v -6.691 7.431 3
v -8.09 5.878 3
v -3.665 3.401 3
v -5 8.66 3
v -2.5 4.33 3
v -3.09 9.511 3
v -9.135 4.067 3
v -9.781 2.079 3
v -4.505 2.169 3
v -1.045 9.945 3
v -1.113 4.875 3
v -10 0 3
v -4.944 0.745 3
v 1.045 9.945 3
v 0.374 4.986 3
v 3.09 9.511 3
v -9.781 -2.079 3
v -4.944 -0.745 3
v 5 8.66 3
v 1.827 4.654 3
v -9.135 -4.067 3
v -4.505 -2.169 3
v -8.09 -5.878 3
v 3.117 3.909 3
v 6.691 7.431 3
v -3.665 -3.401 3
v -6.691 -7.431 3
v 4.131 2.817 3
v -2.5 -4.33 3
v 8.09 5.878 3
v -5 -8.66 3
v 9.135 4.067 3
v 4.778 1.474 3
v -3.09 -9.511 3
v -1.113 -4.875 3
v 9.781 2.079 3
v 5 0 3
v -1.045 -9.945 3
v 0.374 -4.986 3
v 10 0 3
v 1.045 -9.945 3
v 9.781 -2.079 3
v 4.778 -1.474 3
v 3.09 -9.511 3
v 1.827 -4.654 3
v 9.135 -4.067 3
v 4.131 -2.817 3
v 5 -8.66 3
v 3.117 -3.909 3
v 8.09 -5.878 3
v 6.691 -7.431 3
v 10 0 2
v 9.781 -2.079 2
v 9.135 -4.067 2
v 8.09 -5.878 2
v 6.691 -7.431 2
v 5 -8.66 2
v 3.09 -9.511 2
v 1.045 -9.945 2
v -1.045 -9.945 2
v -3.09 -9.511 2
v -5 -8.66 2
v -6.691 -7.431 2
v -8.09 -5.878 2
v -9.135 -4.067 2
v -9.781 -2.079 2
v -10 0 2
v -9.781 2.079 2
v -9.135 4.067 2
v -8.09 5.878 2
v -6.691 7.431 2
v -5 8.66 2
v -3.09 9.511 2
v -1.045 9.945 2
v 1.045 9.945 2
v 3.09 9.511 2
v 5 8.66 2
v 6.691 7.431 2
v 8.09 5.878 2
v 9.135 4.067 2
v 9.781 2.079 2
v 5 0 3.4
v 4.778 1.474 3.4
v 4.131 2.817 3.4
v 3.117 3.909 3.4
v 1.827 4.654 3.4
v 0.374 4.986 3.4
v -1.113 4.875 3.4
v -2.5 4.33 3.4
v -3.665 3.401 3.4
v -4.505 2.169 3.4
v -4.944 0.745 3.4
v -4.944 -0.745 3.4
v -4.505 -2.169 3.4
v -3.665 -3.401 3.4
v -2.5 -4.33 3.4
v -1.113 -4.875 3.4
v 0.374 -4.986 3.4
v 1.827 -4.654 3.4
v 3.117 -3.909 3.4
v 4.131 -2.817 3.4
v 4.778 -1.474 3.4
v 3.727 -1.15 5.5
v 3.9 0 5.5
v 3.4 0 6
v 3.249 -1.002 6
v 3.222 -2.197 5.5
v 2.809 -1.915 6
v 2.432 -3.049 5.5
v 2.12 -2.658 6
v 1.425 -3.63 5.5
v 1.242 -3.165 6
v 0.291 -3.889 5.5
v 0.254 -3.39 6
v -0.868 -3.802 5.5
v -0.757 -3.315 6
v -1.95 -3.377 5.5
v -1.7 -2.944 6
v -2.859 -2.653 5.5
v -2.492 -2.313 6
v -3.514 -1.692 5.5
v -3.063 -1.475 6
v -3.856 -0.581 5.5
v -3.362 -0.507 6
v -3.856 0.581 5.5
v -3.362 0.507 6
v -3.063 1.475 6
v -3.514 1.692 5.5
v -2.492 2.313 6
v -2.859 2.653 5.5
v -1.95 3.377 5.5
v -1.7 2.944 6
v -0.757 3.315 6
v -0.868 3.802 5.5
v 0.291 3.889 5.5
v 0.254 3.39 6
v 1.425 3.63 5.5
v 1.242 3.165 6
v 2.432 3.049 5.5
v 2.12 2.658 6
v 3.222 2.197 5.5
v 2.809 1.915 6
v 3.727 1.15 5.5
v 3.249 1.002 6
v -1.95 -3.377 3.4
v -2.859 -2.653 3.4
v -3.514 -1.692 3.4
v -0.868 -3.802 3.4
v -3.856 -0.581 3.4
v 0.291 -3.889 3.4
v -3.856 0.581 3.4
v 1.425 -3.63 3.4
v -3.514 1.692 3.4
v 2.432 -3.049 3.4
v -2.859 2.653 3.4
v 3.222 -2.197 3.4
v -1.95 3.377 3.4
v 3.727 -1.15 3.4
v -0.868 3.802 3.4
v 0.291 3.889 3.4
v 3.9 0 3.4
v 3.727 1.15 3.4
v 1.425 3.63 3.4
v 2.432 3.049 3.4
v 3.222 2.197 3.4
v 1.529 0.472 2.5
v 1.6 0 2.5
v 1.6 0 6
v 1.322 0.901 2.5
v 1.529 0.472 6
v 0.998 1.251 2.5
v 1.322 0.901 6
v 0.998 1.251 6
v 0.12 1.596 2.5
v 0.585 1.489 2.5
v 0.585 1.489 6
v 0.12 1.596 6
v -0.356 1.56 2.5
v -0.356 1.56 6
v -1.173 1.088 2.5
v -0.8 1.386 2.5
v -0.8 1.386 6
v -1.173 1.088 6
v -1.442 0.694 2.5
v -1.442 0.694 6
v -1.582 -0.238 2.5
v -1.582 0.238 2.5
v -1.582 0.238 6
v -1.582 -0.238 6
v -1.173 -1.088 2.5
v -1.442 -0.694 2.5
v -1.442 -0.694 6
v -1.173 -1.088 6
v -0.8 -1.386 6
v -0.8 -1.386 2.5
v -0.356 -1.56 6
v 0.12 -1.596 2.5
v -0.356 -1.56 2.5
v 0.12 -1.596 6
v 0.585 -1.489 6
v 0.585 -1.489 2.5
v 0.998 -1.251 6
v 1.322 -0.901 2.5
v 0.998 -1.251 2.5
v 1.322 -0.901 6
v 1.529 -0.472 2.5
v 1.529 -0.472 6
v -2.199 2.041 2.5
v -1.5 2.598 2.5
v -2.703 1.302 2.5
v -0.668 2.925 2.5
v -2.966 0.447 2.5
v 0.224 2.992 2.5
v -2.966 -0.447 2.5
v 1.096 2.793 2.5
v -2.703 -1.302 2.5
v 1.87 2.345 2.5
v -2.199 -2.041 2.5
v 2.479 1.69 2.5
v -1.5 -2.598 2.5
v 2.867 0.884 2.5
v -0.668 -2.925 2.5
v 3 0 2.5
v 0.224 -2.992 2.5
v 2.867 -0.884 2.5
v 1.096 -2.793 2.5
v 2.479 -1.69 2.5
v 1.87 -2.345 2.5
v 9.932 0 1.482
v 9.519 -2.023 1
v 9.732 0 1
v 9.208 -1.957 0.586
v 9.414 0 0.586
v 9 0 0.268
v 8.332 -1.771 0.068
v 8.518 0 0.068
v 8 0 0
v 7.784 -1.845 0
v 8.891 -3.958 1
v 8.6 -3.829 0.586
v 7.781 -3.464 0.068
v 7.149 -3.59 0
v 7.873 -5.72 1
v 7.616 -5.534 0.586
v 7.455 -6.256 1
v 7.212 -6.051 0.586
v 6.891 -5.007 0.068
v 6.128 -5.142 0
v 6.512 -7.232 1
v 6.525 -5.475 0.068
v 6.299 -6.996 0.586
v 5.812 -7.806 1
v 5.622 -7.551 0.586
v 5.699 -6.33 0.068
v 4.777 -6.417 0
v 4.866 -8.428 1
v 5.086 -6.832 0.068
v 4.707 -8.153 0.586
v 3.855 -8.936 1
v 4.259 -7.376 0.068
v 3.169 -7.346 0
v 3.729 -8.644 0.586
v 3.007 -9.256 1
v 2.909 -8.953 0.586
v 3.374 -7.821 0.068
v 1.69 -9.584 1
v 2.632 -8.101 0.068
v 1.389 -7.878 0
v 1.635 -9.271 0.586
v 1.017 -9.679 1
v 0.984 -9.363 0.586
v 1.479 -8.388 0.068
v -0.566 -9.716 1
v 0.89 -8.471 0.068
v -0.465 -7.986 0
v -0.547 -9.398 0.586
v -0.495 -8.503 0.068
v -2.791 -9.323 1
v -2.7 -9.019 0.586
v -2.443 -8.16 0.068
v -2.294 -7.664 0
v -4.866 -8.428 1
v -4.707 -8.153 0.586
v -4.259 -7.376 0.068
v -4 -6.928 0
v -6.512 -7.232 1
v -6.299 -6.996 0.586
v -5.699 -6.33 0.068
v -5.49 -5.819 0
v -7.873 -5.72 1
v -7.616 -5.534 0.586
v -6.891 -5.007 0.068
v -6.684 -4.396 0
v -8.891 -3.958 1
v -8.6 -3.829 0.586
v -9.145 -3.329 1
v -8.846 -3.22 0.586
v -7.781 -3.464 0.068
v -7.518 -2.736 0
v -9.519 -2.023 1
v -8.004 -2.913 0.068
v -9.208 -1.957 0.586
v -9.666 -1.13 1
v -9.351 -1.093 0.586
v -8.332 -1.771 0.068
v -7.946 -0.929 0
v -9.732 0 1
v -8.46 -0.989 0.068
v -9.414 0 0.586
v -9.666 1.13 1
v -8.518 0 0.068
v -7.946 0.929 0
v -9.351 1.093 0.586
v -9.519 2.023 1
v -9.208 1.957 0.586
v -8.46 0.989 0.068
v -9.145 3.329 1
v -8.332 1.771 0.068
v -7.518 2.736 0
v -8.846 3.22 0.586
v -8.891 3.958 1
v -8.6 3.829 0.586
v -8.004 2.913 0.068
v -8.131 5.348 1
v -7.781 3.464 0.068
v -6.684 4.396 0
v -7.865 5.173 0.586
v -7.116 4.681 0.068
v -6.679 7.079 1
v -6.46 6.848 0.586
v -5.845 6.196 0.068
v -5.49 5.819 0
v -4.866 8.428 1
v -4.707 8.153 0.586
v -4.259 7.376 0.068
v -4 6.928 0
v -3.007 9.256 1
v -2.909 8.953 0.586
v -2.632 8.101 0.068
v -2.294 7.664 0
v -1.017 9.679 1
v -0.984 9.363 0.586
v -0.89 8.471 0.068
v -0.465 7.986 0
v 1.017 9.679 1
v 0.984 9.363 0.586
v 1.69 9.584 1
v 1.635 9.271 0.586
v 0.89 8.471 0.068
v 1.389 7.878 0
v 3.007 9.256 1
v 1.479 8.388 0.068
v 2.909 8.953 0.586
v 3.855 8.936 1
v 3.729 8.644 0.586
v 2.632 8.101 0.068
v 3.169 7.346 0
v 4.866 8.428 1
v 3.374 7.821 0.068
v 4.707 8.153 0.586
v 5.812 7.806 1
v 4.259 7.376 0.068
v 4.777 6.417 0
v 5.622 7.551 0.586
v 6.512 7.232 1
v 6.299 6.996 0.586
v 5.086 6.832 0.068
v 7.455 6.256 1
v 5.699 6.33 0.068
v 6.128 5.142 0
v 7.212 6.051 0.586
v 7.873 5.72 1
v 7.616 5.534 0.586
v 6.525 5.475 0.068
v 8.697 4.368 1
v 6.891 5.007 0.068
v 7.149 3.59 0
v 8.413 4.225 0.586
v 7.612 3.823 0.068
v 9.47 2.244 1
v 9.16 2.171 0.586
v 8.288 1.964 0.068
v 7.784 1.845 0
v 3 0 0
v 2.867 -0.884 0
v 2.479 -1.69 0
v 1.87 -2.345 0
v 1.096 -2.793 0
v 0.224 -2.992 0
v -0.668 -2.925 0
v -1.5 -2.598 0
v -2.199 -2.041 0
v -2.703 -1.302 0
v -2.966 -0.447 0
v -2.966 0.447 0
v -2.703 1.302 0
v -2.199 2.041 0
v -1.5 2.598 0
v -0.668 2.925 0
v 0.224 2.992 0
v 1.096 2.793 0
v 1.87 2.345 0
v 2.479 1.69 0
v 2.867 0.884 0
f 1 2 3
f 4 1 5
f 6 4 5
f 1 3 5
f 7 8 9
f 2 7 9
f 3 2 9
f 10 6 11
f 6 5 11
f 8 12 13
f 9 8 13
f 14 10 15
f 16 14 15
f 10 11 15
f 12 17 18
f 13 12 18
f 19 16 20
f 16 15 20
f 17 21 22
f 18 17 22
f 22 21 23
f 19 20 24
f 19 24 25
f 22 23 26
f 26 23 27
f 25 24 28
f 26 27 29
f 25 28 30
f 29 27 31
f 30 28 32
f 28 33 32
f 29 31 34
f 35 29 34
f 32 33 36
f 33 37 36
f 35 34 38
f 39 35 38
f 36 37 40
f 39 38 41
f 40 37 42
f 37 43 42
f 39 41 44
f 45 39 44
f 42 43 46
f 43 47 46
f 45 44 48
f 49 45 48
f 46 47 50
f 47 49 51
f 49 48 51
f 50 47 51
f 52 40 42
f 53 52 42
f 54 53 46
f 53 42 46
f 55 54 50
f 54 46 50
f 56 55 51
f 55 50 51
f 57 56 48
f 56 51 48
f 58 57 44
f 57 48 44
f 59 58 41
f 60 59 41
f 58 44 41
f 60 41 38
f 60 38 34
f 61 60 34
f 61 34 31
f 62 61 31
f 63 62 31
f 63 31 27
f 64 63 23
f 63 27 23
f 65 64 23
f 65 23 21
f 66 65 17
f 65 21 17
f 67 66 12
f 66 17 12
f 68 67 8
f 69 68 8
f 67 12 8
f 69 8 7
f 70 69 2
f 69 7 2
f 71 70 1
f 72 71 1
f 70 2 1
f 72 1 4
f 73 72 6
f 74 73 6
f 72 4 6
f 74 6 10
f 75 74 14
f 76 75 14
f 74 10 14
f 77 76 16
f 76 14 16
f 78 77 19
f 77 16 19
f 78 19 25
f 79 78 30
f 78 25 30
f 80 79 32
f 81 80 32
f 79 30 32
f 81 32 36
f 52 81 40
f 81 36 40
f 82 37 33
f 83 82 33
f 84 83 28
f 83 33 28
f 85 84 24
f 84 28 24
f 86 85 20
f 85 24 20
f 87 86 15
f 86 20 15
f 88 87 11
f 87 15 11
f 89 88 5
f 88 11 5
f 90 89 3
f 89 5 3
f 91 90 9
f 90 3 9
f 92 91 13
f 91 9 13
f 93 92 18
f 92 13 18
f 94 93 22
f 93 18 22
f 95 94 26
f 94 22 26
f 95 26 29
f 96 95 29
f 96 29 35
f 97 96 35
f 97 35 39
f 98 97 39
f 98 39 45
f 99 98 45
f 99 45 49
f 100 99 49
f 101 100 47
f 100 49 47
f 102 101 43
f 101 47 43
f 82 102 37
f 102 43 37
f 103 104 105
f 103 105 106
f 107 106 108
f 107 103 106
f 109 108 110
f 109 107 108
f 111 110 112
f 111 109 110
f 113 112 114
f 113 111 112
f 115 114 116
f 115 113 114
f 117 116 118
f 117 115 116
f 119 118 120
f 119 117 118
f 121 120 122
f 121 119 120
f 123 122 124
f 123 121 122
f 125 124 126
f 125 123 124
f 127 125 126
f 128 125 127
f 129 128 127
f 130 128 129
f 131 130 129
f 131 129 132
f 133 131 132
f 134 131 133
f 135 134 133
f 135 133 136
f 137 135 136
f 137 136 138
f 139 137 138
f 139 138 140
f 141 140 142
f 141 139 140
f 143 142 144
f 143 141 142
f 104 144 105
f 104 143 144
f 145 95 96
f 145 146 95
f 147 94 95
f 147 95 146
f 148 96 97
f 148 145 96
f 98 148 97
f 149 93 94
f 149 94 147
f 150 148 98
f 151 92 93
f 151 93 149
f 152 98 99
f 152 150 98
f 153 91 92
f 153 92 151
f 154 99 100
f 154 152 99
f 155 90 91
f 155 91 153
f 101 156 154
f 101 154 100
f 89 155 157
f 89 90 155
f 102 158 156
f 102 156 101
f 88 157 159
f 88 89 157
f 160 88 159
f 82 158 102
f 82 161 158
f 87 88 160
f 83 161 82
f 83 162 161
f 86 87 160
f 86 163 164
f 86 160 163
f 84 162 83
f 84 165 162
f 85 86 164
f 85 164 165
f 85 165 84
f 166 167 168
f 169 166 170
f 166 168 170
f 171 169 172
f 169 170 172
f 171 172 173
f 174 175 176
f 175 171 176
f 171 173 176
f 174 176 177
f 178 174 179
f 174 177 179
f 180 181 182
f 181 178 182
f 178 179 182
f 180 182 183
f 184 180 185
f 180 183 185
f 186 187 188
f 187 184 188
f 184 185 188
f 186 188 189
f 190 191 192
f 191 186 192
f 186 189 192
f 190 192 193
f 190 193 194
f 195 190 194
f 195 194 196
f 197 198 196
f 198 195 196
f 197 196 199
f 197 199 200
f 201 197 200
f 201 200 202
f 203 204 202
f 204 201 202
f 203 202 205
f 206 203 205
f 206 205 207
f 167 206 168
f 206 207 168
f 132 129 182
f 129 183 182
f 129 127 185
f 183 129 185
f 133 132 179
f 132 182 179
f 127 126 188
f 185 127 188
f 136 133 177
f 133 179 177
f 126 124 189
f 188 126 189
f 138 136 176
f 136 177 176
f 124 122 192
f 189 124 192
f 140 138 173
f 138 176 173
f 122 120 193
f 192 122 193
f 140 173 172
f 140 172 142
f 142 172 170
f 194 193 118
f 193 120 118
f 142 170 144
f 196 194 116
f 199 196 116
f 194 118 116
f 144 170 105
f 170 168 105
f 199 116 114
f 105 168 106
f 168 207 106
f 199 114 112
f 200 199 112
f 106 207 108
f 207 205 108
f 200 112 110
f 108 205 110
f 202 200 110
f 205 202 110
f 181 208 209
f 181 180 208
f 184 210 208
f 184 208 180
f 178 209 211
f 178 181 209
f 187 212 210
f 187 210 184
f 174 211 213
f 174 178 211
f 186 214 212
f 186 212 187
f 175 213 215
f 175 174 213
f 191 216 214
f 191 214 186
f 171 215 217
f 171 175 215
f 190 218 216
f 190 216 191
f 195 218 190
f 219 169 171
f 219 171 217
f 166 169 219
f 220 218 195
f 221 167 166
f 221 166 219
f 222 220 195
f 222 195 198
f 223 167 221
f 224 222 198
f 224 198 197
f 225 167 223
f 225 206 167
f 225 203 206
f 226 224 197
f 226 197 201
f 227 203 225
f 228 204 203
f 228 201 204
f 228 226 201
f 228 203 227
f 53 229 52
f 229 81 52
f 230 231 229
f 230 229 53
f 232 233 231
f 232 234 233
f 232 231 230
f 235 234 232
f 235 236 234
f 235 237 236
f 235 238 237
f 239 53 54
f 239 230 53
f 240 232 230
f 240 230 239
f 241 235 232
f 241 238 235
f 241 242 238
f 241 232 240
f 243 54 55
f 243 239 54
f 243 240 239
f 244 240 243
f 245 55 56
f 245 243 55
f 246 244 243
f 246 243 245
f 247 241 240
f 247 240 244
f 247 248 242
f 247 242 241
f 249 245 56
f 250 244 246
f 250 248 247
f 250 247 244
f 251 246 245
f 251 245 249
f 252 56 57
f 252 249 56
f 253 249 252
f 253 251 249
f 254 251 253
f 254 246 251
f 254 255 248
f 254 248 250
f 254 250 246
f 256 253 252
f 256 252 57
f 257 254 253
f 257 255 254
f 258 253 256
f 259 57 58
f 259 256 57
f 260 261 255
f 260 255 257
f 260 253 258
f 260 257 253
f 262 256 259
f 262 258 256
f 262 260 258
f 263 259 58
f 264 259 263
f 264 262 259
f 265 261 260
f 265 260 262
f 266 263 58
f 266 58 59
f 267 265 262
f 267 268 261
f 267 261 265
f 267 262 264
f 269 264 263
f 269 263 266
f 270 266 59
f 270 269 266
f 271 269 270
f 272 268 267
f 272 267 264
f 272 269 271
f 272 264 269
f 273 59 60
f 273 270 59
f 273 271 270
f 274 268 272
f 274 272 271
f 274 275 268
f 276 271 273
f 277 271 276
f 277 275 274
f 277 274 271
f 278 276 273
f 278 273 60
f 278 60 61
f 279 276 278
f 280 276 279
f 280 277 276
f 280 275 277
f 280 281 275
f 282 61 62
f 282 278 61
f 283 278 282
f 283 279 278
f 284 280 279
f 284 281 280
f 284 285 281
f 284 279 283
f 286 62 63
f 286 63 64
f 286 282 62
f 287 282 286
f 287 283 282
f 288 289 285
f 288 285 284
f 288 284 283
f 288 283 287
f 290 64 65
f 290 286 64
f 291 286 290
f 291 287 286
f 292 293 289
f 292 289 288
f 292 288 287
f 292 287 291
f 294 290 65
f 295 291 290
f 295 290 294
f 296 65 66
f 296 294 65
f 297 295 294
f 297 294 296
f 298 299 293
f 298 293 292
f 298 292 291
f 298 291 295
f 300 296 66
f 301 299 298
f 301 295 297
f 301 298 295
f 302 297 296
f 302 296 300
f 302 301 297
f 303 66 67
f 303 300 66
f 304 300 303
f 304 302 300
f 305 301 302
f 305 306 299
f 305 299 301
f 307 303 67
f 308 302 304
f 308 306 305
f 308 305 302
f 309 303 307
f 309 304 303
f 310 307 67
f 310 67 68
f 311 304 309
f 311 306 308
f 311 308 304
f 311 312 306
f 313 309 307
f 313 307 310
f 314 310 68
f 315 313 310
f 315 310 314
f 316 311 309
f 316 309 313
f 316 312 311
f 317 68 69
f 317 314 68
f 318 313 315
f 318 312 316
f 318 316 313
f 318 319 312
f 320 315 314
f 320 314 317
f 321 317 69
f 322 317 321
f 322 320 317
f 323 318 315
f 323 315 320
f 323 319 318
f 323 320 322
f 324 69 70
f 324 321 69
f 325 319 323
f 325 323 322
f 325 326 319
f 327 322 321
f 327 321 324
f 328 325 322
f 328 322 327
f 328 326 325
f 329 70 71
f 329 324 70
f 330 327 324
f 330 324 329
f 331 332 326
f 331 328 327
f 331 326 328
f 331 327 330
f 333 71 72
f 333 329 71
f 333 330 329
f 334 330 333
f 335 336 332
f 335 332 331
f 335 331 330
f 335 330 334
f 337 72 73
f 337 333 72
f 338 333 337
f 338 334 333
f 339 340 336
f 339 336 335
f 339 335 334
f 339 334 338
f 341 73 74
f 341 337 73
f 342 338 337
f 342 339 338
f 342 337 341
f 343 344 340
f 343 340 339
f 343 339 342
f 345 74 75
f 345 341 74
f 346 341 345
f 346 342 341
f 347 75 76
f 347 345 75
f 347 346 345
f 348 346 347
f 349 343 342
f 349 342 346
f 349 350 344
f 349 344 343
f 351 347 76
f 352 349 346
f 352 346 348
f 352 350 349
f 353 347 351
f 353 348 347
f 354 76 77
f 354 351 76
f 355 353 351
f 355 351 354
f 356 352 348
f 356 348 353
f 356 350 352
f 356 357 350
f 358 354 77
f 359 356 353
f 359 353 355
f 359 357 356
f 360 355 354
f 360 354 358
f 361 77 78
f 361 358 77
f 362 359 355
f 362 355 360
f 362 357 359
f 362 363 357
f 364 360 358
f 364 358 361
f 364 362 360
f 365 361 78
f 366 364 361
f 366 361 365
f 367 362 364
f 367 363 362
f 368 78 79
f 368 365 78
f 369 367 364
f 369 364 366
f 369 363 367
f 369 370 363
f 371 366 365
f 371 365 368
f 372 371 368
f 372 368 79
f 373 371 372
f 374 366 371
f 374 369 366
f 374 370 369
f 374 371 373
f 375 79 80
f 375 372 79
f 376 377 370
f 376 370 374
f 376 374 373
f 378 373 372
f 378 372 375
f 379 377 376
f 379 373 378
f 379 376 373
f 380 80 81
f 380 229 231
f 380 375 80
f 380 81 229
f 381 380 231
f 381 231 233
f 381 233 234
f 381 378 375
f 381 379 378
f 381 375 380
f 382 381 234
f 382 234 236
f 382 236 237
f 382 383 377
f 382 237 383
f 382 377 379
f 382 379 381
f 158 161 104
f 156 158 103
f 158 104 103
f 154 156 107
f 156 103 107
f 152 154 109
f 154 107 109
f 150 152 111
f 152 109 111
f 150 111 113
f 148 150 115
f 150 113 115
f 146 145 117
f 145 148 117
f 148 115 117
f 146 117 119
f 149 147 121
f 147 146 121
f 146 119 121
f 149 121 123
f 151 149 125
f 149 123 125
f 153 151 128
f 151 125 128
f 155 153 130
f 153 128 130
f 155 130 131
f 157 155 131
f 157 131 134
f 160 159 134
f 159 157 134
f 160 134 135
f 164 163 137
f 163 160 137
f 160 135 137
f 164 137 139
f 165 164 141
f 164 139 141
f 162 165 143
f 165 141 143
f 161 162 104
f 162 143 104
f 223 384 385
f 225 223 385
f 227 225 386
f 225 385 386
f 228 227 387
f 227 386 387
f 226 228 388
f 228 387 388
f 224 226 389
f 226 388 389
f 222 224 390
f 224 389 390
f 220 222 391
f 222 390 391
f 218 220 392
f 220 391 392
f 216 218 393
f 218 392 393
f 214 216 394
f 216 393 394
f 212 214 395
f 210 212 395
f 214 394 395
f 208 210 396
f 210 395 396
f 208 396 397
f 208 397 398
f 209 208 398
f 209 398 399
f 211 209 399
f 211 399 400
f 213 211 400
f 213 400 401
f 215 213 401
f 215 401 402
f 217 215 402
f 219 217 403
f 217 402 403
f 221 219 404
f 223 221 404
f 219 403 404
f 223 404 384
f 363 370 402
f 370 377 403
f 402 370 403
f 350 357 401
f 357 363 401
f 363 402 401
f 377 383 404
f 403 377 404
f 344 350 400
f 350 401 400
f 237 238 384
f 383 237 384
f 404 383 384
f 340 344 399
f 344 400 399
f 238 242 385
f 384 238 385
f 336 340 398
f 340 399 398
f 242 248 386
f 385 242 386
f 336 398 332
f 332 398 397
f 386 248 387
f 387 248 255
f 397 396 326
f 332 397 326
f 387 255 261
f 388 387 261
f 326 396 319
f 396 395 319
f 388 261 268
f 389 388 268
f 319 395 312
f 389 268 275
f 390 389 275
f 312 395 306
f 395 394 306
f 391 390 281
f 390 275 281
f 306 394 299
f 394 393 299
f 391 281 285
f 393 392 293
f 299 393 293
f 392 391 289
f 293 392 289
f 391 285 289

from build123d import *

# Parameters (mm, degrees)
F2_SIZE  = 0.5
F3_R     = 5
F3_R_2   = 3.9
F4_DEPTH = 0.4
F5_R     = 2
F6_R     = 1.6
F7_DEPTH = 25
F8_R     = 3
F8_R_2   = 1.6
F9_DEPTH = 2.5


# Not quite as in the source:
# - a feature names something its author has since deleted; it is built from what else it names


with BuildPart() as f1:
    # F0 (on Front) → F1 (revolve)
    with BuildSketch(Plane.XZ):
        Polygon((3.9, 6), (0, 6), (0, 0), (10, 0), (10, 3), (3.9, 3), align=None)
    revolve(axis=Axis((0, 0, 3), (0, 0, -1)))

    # F2
    f2_edges = [f1.edges().sort_by_distance(p)[0] for p in [
        (-3.9, 0, 6),
    ]]
    chamfer(f2_edges, length=F2_SIZE)

    # F3 (on face) → F4 (join)
    with BuildSketch(Plane.XY.offset(3)):
        Circle(F3_R)
        Circle(F3_R_2, mode=Mode.SUBTRACT)
    extrude(amount=F4_DEPTH)

    # F5
    f5_edges = [f1.edges().sort_by_distance(p)[0] for p in [
        (-10, 0, 0),
    ]]
    fillet(f5_edges, radius=F5_R)

    # F6 (on face) → F7 (cut)
    with BuildSketch(Plane.XY.offset(6)):
        Circle(F6_R)
    extrude(amount=-F7_DEPTH, mode=Mode.SUBTRACT)

    # F8 (on face) → F9 (cut)
    with BuildSketch(Plane(origin=(0, 0, 0), x_dir=(1, 0, 0), z_dir=(0, 0, -1))):
        Circle(F8_R)
        Circle(F8_R_2, mode=Mode.SUBTRACT)
    extrude(amount=-F9_DEPTH, mode=Mode.SUBTRACT)


solid = f1.part
